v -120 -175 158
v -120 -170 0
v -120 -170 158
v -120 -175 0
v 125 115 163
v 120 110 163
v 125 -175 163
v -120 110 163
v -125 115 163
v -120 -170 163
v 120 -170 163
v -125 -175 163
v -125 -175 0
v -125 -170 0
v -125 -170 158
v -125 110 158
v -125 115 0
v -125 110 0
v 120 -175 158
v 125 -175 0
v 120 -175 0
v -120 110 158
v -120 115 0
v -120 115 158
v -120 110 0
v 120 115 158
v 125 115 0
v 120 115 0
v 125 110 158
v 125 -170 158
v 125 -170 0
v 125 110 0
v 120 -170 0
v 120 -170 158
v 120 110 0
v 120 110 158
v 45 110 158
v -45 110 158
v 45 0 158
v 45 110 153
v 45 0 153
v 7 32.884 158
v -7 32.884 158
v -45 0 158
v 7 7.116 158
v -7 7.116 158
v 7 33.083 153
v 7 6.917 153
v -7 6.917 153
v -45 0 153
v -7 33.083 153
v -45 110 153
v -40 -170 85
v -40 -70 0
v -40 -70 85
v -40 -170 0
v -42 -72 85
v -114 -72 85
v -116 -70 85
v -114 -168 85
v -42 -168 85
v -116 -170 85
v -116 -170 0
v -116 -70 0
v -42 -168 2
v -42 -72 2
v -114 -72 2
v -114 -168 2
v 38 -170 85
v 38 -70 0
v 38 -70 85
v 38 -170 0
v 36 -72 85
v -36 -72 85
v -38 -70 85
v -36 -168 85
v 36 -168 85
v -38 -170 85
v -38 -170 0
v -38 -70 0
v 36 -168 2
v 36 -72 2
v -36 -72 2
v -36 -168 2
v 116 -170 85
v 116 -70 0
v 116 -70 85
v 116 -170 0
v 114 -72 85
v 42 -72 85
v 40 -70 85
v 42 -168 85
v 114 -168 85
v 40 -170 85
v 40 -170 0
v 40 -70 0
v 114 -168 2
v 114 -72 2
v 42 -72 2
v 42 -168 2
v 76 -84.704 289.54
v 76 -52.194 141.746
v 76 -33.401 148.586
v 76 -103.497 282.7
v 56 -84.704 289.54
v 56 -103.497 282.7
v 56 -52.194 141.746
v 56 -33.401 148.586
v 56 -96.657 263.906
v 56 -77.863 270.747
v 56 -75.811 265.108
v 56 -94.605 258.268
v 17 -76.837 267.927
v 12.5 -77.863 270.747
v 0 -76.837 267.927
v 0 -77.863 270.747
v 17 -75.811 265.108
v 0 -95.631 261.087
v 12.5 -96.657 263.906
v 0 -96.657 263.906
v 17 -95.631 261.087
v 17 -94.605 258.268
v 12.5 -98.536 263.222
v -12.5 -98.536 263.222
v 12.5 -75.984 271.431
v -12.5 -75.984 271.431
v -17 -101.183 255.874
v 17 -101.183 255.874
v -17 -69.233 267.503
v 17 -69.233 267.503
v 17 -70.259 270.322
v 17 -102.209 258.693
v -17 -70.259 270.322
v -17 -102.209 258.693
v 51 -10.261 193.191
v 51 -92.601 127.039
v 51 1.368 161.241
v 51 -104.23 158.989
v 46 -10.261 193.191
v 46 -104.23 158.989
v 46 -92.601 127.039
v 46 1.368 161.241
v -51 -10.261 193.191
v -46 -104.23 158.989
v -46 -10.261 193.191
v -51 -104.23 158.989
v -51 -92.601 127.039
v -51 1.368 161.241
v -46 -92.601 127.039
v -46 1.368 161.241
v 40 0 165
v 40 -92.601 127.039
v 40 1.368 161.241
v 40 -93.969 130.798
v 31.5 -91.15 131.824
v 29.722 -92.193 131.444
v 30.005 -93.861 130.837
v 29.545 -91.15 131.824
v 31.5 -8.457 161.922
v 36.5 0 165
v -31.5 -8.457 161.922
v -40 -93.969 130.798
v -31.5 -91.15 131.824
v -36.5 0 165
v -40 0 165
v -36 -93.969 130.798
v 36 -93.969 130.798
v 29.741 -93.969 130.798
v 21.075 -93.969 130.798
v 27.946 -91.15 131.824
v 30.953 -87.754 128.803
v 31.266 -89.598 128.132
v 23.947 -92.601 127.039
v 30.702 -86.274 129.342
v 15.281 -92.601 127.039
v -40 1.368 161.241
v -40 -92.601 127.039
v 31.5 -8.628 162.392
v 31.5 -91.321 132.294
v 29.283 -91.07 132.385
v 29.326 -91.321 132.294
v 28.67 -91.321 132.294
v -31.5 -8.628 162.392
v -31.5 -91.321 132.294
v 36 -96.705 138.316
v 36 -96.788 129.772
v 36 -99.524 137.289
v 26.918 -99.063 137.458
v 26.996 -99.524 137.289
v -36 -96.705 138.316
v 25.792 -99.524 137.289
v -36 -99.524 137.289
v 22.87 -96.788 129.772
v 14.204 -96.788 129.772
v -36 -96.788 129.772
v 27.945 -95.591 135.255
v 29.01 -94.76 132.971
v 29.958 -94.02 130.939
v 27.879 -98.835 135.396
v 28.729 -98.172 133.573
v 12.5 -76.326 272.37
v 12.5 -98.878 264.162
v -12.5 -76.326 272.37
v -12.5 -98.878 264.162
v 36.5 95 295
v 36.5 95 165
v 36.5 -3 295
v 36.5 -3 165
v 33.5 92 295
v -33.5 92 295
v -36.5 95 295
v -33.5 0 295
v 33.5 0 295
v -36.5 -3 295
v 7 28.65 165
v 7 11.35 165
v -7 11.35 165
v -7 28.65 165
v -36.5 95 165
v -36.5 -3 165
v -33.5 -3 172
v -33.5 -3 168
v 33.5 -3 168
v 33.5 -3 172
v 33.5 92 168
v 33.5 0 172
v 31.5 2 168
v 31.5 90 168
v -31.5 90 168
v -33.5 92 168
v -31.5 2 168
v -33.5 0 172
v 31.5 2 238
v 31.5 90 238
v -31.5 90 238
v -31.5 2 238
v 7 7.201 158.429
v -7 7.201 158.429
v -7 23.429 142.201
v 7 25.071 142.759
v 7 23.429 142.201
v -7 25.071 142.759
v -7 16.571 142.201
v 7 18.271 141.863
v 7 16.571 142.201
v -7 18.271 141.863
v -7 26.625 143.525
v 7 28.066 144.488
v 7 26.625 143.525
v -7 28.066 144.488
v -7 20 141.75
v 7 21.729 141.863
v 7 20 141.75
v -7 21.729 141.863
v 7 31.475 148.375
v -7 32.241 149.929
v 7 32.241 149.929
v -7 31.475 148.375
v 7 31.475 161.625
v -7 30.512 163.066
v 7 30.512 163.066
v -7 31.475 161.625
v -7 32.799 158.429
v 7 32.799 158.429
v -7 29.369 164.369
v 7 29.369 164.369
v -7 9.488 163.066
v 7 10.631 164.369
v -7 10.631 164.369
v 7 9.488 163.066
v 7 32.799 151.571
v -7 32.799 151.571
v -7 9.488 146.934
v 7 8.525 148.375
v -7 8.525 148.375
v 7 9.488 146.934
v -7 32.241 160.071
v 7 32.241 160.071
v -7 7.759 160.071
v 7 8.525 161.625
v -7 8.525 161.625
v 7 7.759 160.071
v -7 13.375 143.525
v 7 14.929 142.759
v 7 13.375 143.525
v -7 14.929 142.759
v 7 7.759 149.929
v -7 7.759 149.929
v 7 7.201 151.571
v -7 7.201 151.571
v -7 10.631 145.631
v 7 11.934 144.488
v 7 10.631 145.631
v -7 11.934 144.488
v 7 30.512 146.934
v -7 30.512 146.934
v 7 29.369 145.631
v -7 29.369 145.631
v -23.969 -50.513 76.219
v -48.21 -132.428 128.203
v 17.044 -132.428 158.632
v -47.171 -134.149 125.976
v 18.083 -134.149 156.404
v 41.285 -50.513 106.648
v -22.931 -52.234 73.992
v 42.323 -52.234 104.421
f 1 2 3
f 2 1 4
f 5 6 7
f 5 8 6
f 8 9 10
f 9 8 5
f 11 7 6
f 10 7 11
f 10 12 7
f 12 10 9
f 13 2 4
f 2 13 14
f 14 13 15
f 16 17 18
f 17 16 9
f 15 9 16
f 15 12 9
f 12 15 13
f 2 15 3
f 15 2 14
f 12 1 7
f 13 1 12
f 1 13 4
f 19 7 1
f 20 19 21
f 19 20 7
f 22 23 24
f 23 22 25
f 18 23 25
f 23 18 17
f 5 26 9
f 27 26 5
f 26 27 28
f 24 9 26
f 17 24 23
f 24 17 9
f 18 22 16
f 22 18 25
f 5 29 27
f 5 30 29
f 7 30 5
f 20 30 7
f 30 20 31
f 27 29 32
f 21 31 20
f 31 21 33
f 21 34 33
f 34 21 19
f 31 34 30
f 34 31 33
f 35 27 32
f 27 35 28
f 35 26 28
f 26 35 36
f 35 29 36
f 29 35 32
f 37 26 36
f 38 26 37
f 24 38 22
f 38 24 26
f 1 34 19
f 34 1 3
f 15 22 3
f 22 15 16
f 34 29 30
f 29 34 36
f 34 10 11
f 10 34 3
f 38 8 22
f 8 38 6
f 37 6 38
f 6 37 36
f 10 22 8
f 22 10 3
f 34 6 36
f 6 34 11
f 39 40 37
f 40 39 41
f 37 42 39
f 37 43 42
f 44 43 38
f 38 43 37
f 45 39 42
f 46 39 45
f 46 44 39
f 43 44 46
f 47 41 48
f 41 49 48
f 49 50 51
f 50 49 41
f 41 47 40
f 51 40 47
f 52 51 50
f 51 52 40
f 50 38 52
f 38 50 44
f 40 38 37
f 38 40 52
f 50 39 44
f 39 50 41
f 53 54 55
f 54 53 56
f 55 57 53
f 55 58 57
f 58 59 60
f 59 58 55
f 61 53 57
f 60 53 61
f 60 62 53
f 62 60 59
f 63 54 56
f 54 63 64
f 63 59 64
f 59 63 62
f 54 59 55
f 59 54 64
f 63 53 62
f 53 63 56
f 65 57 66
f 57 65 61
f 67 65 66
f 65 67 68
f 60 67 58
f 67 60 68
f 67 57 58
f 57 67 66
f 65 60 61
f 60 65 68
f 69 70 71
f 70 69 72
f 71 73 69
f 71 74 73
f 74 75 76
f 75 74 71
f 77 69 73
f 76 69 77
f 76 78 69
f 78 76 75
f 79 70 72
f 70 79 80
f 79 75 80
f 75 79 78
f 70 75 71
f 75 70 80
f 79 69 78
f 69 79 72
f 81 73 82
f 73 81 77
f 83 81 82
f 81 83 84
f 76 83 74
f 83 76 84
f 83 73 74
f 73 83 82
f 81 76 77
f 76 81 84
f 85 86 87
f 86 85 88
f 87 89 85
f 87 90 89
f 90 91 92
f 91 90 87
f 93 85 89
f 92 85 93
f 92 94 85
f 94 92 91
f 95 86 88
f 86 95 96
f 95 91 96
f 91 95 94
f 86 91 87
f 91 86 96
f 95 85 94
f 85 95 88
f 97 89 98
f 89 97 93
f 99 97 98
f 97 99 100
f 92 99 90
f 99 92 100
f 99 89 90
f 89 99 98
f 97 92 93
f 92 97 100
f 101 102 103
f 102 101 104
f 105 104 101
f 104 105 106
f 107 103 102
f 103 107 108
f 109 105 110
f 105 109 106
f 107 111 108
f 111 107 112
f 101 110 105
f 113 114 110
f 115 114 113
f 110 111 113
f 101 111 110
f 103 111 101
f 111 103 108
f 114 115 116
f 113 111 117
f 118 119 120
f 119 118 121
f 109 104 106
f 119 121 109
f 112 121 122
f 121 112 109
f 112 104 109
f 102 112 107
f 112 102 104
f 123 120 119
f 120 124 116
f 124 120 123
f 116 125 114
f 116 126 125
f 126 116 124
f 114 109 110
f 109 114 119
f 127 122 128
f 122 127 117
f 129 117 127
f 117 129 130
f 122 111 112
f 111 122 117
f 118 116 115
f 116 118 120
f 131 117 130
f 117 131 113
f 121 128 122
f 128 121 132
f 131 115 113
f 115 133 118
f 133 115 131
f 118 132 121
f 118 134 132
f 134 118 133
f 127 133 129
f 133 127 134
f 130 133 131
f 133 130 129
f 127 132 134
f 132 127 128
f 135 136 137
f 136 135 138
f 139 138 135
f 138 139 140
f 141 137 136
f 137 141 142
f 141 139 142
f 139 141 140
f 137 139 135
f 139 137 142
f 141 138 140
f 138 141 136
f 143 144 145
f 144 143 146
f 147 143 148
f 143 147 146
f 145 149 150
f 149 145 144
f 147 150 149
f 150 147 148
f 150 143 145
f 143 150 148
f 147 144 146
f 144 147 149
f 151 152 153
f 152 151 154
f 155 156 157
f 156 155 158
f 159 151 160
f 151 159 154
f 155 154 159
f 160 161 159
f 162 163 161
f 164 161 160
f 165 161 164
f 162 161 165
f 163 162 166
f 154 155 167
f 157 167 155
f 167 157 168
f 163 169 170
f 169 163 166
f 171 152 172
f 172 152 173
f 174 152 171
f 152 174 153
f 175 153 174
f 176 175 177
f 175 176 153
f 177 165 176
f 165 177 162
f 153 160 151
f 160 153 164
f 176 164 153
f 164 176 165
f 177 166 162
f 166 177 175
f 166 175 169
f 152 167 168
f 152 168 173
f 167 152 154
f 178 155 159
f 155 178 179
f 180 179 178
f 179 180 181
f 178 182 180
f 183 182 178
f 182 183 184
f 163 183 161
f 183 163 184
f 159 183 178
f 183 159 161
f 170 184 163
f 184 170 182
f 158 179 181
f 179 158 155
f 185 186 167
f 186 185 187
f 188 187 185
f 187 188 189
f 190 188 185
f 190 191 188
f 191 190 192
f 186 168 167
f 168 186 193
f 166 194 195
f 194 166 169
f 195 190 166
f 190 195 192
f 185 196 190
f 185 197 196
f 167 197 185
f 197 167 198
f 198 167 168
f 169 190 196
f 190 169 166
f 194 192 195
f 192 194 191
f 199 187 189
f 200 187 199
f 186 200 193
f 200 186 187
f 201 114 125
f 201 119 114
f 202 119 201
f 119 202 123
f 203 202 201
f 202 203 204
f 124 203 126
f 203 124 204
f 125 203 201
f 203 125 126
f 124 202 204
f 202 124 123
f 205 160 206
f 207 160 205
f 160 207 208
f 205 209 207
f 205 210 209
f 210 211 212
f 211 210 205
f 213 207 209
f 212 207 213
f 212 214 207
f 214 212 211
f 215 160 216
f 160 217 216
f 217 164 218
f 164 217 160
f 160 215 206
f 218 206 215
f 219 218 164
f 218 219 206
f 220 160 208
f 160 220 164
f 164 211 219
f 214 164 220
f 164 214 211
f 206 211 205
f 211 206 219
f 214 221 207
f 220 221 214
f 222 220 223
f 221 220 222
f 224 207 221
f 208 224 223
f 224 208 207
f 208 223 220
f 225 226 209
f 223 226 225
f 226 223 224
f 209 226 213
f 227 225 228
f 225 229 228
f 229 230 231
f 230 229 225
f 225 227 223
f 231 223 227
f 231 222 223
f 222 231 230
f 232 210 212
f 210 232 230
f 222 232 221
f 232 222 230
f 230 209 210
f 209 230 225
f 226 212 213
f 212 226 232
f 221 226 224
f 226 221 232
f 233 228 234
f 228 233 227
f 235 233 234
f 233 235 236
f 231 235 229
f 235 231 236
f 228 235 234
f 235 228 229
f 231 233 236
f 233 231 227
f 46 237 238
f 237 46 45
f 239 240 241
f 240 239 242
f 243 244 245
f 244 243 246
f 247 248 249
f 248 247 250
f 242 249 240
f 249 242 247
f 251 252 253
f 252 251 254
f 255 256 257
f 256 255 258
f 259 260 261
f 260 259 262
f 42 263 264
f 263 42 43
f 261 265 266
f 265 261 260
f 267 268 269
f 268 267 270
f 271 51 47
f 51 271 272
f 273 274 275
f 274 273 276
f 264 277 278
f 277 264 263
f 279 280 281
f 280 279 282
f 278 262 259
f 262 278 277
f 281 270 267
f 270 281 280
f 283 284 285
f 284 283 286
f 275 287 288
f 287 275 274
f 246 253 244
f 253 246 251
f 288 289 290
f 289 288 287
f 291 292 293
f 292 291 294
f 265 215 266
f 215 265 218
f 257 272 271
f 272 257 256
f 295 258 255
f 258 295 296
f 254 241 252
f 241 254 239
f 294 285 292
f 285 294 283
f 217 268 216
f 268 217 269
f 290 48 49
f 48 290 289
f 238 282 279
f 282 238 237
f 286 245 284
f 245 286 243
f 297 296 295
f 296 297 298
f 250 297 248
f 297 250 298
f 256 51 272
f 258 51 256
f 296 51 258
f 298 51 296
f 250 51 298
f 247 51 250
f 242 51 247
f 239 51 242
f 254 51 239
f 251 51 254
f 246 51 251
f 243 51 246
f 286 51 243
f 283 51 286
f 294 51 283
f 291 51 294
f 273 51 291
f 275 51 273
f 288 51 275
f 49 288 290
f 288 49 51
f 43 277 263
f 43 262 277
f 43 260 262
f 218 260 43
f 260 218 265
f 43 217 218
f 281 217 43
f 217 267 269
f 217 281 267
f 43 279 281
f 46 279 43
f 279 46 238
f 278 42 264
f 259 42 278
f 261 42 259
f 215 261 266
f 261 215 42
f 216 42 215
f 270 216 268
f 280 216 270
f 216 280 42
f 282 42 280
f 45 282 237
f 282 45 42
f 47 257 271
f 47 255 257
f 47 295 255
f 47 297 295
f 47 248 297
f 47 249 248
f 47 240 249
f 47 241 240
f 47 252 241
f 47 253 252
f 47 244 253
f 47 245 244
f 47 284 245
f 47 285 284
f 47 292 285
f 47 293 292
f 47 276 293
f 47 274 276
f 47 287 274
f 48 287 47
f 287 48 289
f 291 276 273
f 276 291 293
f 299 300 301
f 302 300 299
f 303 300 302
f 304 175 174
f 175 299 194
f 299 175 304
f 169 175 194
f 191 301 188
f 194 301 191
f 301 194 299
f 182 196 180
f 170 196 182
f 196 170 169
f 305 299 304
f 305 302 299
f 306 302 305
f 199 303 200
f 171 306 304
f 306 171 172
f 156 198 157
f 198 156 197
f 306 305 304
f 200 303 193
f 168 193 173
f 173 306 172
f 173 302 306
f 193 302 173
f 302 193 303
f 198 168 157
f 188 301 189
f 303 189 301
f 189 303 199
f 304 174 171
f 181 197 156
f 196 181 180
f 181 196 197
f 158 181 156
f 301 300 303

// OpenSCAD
// Concept layout of the full sifter, in the style of the Roca Sifter: a countertop box
// with a card stack at the back, a camera tower, and three bins at the front.
//
// This is a PICTURE of the plan, not printable parts. The pieces get designed one at a
// time (feeder_test.scad is the first) and tested before the next one is built.
//
// Card path, back to front:
//   1. hopper: up to ~400 cards, face up
//   2. pick roller pushes the bottom card under the gate
//   3. card slides down the sloped scan bed and stops against the stop gate
//   4. camera in the tower takes the picture
//   5. stop gate drops, card slides into the chute
//   6. chute tilts left / centre / right into bin 1, 2 or 3

card_w = 63;
card_l = 88;
bed_angle = 20;       // steep enough for cards to slide on PLA
bed_len = 100;
bed_top = 165;        // height of the scan bed's back edge
cam_height = 120;     // camera above the card, square to the bed
bin_w = 76;
bin_l = 100;
bin_h = 85;           // holds about 250 cards
hopper_h = 130;       // holds about 400 cards

$fn = 48;

// --- bins ----------------------------------------------------------------------
module bins() {
    for (i = [-1, 0, 1]) translate([i * (bin_w + 2) - bin_w / 2, -bin_l - 70, 0]) difference() {
        cube([bin_w, bin_l, bin_h]);
        translate([2, 2, 2]) cube([bin_w - 4, bin_l - 4, bin_h]);
    }
}

// --- chute: a tray that slides cards down into a bin; a servo tilts it sideways ----
module chute(tilt = -25) {
    translate([0, -85, bin_h + 25]) rotate([0, tilt, 0]) rotate([-35, 0, 0])
        difference() {
            translate([-36, -60, 0]) cube([72, 100, 3]);
        }
}

// --- scan bed, tilted down towards the front -------------------------------------------
module bed() {
    translate([0, 0, bed_top]) rotate([bed_angle, 0, 0]) {
        color("white") translate([-40, -bed_len, -4]) cube([80, bed_len, 4]);
        // card resting against the stop gate
        color("tan") translate([-card_w / 2, -bed_len + 3, 0]) cube([card_w, card_l, 0.5]);
        // stop gate (servo flips it down to let the card go)
        color("orange") translate([-36, -bed_len - 3, 0]) cube([72, 3, 8]);
        // camera tower beside the bed (not in the card's path), square to the bed
        color("lightblue") {
            translate([56, -bed_len / 2 + 3 - 10, -4]) cube([20, 20, cam_height + 30]);
            translate([0, -bed_len / 2 + 3 - 10, cam_height]) cube([76, 20, 6]);
            translate([-17, -bed_len / 2 + 3 - 17, cam_height]) cube([34, 34, 3]);
        }
        color("green") translate([-12.5, -bed_len / 2 + 3 - 12, cam_height + 6]) cube([25, 24, 1]);
        // light walls on both sides
        for (m = [0, 1]) mirror([m, 0, 0]) color("white") translate([46, -bed_len, -4]) cube([5, bed_len, 34]);
    }
}

// --- hopper with the pick roller underneath (see feeder_test.scad) --------------------
module hopper() {
    in_w = card_w + 4; in_l = card_l + 4;
    translate([0, 0, bed_top]) {
        color("white") difference() {
            translate([-in_w / 2 - 3, -3, 0]) cube([in_w + 6, in_l + 6, hopper_h]);
            translate([-in_w / 2, 0, 3]) cube([in_w, in_l, hopper_h]);
            translate([-in_w / 2, -4, 3]) cube([in_w, 5, 4]);  // gate slot
        }
        color("tan") translate([-card_w / 2, 2, 3]) cube([card_w, card_l, 70]);
        color("black") translate([0, 20, -10]) rotate([0, 90, 0]) cylinder(d = 26.5, h = 14, center = true);
    }
}

// --- body: drawn as an open frame so the inside shows ------------------------------
module body() {
    color("dimgray") {
        for (x = [-125, 120], y = [-175, 110]) translate([x, y, 0]) cube([5, 5, bed_top - 2]);
        for (y = [-175, 110]) translate([-125, y, bed_top - 7]) cube([250, 5, 5]);
        for (x = [-125, 120]) translate([x, -175, bed_top - 7]) cube([5, 290, 5]);
        // shelf the hopper and bed sit on
        translate([-45, 0, bed_top - 12]) cube([90, 110, 5]);
    }
}

body();
bins();
color("orange") chute();
bed();
hopper();
